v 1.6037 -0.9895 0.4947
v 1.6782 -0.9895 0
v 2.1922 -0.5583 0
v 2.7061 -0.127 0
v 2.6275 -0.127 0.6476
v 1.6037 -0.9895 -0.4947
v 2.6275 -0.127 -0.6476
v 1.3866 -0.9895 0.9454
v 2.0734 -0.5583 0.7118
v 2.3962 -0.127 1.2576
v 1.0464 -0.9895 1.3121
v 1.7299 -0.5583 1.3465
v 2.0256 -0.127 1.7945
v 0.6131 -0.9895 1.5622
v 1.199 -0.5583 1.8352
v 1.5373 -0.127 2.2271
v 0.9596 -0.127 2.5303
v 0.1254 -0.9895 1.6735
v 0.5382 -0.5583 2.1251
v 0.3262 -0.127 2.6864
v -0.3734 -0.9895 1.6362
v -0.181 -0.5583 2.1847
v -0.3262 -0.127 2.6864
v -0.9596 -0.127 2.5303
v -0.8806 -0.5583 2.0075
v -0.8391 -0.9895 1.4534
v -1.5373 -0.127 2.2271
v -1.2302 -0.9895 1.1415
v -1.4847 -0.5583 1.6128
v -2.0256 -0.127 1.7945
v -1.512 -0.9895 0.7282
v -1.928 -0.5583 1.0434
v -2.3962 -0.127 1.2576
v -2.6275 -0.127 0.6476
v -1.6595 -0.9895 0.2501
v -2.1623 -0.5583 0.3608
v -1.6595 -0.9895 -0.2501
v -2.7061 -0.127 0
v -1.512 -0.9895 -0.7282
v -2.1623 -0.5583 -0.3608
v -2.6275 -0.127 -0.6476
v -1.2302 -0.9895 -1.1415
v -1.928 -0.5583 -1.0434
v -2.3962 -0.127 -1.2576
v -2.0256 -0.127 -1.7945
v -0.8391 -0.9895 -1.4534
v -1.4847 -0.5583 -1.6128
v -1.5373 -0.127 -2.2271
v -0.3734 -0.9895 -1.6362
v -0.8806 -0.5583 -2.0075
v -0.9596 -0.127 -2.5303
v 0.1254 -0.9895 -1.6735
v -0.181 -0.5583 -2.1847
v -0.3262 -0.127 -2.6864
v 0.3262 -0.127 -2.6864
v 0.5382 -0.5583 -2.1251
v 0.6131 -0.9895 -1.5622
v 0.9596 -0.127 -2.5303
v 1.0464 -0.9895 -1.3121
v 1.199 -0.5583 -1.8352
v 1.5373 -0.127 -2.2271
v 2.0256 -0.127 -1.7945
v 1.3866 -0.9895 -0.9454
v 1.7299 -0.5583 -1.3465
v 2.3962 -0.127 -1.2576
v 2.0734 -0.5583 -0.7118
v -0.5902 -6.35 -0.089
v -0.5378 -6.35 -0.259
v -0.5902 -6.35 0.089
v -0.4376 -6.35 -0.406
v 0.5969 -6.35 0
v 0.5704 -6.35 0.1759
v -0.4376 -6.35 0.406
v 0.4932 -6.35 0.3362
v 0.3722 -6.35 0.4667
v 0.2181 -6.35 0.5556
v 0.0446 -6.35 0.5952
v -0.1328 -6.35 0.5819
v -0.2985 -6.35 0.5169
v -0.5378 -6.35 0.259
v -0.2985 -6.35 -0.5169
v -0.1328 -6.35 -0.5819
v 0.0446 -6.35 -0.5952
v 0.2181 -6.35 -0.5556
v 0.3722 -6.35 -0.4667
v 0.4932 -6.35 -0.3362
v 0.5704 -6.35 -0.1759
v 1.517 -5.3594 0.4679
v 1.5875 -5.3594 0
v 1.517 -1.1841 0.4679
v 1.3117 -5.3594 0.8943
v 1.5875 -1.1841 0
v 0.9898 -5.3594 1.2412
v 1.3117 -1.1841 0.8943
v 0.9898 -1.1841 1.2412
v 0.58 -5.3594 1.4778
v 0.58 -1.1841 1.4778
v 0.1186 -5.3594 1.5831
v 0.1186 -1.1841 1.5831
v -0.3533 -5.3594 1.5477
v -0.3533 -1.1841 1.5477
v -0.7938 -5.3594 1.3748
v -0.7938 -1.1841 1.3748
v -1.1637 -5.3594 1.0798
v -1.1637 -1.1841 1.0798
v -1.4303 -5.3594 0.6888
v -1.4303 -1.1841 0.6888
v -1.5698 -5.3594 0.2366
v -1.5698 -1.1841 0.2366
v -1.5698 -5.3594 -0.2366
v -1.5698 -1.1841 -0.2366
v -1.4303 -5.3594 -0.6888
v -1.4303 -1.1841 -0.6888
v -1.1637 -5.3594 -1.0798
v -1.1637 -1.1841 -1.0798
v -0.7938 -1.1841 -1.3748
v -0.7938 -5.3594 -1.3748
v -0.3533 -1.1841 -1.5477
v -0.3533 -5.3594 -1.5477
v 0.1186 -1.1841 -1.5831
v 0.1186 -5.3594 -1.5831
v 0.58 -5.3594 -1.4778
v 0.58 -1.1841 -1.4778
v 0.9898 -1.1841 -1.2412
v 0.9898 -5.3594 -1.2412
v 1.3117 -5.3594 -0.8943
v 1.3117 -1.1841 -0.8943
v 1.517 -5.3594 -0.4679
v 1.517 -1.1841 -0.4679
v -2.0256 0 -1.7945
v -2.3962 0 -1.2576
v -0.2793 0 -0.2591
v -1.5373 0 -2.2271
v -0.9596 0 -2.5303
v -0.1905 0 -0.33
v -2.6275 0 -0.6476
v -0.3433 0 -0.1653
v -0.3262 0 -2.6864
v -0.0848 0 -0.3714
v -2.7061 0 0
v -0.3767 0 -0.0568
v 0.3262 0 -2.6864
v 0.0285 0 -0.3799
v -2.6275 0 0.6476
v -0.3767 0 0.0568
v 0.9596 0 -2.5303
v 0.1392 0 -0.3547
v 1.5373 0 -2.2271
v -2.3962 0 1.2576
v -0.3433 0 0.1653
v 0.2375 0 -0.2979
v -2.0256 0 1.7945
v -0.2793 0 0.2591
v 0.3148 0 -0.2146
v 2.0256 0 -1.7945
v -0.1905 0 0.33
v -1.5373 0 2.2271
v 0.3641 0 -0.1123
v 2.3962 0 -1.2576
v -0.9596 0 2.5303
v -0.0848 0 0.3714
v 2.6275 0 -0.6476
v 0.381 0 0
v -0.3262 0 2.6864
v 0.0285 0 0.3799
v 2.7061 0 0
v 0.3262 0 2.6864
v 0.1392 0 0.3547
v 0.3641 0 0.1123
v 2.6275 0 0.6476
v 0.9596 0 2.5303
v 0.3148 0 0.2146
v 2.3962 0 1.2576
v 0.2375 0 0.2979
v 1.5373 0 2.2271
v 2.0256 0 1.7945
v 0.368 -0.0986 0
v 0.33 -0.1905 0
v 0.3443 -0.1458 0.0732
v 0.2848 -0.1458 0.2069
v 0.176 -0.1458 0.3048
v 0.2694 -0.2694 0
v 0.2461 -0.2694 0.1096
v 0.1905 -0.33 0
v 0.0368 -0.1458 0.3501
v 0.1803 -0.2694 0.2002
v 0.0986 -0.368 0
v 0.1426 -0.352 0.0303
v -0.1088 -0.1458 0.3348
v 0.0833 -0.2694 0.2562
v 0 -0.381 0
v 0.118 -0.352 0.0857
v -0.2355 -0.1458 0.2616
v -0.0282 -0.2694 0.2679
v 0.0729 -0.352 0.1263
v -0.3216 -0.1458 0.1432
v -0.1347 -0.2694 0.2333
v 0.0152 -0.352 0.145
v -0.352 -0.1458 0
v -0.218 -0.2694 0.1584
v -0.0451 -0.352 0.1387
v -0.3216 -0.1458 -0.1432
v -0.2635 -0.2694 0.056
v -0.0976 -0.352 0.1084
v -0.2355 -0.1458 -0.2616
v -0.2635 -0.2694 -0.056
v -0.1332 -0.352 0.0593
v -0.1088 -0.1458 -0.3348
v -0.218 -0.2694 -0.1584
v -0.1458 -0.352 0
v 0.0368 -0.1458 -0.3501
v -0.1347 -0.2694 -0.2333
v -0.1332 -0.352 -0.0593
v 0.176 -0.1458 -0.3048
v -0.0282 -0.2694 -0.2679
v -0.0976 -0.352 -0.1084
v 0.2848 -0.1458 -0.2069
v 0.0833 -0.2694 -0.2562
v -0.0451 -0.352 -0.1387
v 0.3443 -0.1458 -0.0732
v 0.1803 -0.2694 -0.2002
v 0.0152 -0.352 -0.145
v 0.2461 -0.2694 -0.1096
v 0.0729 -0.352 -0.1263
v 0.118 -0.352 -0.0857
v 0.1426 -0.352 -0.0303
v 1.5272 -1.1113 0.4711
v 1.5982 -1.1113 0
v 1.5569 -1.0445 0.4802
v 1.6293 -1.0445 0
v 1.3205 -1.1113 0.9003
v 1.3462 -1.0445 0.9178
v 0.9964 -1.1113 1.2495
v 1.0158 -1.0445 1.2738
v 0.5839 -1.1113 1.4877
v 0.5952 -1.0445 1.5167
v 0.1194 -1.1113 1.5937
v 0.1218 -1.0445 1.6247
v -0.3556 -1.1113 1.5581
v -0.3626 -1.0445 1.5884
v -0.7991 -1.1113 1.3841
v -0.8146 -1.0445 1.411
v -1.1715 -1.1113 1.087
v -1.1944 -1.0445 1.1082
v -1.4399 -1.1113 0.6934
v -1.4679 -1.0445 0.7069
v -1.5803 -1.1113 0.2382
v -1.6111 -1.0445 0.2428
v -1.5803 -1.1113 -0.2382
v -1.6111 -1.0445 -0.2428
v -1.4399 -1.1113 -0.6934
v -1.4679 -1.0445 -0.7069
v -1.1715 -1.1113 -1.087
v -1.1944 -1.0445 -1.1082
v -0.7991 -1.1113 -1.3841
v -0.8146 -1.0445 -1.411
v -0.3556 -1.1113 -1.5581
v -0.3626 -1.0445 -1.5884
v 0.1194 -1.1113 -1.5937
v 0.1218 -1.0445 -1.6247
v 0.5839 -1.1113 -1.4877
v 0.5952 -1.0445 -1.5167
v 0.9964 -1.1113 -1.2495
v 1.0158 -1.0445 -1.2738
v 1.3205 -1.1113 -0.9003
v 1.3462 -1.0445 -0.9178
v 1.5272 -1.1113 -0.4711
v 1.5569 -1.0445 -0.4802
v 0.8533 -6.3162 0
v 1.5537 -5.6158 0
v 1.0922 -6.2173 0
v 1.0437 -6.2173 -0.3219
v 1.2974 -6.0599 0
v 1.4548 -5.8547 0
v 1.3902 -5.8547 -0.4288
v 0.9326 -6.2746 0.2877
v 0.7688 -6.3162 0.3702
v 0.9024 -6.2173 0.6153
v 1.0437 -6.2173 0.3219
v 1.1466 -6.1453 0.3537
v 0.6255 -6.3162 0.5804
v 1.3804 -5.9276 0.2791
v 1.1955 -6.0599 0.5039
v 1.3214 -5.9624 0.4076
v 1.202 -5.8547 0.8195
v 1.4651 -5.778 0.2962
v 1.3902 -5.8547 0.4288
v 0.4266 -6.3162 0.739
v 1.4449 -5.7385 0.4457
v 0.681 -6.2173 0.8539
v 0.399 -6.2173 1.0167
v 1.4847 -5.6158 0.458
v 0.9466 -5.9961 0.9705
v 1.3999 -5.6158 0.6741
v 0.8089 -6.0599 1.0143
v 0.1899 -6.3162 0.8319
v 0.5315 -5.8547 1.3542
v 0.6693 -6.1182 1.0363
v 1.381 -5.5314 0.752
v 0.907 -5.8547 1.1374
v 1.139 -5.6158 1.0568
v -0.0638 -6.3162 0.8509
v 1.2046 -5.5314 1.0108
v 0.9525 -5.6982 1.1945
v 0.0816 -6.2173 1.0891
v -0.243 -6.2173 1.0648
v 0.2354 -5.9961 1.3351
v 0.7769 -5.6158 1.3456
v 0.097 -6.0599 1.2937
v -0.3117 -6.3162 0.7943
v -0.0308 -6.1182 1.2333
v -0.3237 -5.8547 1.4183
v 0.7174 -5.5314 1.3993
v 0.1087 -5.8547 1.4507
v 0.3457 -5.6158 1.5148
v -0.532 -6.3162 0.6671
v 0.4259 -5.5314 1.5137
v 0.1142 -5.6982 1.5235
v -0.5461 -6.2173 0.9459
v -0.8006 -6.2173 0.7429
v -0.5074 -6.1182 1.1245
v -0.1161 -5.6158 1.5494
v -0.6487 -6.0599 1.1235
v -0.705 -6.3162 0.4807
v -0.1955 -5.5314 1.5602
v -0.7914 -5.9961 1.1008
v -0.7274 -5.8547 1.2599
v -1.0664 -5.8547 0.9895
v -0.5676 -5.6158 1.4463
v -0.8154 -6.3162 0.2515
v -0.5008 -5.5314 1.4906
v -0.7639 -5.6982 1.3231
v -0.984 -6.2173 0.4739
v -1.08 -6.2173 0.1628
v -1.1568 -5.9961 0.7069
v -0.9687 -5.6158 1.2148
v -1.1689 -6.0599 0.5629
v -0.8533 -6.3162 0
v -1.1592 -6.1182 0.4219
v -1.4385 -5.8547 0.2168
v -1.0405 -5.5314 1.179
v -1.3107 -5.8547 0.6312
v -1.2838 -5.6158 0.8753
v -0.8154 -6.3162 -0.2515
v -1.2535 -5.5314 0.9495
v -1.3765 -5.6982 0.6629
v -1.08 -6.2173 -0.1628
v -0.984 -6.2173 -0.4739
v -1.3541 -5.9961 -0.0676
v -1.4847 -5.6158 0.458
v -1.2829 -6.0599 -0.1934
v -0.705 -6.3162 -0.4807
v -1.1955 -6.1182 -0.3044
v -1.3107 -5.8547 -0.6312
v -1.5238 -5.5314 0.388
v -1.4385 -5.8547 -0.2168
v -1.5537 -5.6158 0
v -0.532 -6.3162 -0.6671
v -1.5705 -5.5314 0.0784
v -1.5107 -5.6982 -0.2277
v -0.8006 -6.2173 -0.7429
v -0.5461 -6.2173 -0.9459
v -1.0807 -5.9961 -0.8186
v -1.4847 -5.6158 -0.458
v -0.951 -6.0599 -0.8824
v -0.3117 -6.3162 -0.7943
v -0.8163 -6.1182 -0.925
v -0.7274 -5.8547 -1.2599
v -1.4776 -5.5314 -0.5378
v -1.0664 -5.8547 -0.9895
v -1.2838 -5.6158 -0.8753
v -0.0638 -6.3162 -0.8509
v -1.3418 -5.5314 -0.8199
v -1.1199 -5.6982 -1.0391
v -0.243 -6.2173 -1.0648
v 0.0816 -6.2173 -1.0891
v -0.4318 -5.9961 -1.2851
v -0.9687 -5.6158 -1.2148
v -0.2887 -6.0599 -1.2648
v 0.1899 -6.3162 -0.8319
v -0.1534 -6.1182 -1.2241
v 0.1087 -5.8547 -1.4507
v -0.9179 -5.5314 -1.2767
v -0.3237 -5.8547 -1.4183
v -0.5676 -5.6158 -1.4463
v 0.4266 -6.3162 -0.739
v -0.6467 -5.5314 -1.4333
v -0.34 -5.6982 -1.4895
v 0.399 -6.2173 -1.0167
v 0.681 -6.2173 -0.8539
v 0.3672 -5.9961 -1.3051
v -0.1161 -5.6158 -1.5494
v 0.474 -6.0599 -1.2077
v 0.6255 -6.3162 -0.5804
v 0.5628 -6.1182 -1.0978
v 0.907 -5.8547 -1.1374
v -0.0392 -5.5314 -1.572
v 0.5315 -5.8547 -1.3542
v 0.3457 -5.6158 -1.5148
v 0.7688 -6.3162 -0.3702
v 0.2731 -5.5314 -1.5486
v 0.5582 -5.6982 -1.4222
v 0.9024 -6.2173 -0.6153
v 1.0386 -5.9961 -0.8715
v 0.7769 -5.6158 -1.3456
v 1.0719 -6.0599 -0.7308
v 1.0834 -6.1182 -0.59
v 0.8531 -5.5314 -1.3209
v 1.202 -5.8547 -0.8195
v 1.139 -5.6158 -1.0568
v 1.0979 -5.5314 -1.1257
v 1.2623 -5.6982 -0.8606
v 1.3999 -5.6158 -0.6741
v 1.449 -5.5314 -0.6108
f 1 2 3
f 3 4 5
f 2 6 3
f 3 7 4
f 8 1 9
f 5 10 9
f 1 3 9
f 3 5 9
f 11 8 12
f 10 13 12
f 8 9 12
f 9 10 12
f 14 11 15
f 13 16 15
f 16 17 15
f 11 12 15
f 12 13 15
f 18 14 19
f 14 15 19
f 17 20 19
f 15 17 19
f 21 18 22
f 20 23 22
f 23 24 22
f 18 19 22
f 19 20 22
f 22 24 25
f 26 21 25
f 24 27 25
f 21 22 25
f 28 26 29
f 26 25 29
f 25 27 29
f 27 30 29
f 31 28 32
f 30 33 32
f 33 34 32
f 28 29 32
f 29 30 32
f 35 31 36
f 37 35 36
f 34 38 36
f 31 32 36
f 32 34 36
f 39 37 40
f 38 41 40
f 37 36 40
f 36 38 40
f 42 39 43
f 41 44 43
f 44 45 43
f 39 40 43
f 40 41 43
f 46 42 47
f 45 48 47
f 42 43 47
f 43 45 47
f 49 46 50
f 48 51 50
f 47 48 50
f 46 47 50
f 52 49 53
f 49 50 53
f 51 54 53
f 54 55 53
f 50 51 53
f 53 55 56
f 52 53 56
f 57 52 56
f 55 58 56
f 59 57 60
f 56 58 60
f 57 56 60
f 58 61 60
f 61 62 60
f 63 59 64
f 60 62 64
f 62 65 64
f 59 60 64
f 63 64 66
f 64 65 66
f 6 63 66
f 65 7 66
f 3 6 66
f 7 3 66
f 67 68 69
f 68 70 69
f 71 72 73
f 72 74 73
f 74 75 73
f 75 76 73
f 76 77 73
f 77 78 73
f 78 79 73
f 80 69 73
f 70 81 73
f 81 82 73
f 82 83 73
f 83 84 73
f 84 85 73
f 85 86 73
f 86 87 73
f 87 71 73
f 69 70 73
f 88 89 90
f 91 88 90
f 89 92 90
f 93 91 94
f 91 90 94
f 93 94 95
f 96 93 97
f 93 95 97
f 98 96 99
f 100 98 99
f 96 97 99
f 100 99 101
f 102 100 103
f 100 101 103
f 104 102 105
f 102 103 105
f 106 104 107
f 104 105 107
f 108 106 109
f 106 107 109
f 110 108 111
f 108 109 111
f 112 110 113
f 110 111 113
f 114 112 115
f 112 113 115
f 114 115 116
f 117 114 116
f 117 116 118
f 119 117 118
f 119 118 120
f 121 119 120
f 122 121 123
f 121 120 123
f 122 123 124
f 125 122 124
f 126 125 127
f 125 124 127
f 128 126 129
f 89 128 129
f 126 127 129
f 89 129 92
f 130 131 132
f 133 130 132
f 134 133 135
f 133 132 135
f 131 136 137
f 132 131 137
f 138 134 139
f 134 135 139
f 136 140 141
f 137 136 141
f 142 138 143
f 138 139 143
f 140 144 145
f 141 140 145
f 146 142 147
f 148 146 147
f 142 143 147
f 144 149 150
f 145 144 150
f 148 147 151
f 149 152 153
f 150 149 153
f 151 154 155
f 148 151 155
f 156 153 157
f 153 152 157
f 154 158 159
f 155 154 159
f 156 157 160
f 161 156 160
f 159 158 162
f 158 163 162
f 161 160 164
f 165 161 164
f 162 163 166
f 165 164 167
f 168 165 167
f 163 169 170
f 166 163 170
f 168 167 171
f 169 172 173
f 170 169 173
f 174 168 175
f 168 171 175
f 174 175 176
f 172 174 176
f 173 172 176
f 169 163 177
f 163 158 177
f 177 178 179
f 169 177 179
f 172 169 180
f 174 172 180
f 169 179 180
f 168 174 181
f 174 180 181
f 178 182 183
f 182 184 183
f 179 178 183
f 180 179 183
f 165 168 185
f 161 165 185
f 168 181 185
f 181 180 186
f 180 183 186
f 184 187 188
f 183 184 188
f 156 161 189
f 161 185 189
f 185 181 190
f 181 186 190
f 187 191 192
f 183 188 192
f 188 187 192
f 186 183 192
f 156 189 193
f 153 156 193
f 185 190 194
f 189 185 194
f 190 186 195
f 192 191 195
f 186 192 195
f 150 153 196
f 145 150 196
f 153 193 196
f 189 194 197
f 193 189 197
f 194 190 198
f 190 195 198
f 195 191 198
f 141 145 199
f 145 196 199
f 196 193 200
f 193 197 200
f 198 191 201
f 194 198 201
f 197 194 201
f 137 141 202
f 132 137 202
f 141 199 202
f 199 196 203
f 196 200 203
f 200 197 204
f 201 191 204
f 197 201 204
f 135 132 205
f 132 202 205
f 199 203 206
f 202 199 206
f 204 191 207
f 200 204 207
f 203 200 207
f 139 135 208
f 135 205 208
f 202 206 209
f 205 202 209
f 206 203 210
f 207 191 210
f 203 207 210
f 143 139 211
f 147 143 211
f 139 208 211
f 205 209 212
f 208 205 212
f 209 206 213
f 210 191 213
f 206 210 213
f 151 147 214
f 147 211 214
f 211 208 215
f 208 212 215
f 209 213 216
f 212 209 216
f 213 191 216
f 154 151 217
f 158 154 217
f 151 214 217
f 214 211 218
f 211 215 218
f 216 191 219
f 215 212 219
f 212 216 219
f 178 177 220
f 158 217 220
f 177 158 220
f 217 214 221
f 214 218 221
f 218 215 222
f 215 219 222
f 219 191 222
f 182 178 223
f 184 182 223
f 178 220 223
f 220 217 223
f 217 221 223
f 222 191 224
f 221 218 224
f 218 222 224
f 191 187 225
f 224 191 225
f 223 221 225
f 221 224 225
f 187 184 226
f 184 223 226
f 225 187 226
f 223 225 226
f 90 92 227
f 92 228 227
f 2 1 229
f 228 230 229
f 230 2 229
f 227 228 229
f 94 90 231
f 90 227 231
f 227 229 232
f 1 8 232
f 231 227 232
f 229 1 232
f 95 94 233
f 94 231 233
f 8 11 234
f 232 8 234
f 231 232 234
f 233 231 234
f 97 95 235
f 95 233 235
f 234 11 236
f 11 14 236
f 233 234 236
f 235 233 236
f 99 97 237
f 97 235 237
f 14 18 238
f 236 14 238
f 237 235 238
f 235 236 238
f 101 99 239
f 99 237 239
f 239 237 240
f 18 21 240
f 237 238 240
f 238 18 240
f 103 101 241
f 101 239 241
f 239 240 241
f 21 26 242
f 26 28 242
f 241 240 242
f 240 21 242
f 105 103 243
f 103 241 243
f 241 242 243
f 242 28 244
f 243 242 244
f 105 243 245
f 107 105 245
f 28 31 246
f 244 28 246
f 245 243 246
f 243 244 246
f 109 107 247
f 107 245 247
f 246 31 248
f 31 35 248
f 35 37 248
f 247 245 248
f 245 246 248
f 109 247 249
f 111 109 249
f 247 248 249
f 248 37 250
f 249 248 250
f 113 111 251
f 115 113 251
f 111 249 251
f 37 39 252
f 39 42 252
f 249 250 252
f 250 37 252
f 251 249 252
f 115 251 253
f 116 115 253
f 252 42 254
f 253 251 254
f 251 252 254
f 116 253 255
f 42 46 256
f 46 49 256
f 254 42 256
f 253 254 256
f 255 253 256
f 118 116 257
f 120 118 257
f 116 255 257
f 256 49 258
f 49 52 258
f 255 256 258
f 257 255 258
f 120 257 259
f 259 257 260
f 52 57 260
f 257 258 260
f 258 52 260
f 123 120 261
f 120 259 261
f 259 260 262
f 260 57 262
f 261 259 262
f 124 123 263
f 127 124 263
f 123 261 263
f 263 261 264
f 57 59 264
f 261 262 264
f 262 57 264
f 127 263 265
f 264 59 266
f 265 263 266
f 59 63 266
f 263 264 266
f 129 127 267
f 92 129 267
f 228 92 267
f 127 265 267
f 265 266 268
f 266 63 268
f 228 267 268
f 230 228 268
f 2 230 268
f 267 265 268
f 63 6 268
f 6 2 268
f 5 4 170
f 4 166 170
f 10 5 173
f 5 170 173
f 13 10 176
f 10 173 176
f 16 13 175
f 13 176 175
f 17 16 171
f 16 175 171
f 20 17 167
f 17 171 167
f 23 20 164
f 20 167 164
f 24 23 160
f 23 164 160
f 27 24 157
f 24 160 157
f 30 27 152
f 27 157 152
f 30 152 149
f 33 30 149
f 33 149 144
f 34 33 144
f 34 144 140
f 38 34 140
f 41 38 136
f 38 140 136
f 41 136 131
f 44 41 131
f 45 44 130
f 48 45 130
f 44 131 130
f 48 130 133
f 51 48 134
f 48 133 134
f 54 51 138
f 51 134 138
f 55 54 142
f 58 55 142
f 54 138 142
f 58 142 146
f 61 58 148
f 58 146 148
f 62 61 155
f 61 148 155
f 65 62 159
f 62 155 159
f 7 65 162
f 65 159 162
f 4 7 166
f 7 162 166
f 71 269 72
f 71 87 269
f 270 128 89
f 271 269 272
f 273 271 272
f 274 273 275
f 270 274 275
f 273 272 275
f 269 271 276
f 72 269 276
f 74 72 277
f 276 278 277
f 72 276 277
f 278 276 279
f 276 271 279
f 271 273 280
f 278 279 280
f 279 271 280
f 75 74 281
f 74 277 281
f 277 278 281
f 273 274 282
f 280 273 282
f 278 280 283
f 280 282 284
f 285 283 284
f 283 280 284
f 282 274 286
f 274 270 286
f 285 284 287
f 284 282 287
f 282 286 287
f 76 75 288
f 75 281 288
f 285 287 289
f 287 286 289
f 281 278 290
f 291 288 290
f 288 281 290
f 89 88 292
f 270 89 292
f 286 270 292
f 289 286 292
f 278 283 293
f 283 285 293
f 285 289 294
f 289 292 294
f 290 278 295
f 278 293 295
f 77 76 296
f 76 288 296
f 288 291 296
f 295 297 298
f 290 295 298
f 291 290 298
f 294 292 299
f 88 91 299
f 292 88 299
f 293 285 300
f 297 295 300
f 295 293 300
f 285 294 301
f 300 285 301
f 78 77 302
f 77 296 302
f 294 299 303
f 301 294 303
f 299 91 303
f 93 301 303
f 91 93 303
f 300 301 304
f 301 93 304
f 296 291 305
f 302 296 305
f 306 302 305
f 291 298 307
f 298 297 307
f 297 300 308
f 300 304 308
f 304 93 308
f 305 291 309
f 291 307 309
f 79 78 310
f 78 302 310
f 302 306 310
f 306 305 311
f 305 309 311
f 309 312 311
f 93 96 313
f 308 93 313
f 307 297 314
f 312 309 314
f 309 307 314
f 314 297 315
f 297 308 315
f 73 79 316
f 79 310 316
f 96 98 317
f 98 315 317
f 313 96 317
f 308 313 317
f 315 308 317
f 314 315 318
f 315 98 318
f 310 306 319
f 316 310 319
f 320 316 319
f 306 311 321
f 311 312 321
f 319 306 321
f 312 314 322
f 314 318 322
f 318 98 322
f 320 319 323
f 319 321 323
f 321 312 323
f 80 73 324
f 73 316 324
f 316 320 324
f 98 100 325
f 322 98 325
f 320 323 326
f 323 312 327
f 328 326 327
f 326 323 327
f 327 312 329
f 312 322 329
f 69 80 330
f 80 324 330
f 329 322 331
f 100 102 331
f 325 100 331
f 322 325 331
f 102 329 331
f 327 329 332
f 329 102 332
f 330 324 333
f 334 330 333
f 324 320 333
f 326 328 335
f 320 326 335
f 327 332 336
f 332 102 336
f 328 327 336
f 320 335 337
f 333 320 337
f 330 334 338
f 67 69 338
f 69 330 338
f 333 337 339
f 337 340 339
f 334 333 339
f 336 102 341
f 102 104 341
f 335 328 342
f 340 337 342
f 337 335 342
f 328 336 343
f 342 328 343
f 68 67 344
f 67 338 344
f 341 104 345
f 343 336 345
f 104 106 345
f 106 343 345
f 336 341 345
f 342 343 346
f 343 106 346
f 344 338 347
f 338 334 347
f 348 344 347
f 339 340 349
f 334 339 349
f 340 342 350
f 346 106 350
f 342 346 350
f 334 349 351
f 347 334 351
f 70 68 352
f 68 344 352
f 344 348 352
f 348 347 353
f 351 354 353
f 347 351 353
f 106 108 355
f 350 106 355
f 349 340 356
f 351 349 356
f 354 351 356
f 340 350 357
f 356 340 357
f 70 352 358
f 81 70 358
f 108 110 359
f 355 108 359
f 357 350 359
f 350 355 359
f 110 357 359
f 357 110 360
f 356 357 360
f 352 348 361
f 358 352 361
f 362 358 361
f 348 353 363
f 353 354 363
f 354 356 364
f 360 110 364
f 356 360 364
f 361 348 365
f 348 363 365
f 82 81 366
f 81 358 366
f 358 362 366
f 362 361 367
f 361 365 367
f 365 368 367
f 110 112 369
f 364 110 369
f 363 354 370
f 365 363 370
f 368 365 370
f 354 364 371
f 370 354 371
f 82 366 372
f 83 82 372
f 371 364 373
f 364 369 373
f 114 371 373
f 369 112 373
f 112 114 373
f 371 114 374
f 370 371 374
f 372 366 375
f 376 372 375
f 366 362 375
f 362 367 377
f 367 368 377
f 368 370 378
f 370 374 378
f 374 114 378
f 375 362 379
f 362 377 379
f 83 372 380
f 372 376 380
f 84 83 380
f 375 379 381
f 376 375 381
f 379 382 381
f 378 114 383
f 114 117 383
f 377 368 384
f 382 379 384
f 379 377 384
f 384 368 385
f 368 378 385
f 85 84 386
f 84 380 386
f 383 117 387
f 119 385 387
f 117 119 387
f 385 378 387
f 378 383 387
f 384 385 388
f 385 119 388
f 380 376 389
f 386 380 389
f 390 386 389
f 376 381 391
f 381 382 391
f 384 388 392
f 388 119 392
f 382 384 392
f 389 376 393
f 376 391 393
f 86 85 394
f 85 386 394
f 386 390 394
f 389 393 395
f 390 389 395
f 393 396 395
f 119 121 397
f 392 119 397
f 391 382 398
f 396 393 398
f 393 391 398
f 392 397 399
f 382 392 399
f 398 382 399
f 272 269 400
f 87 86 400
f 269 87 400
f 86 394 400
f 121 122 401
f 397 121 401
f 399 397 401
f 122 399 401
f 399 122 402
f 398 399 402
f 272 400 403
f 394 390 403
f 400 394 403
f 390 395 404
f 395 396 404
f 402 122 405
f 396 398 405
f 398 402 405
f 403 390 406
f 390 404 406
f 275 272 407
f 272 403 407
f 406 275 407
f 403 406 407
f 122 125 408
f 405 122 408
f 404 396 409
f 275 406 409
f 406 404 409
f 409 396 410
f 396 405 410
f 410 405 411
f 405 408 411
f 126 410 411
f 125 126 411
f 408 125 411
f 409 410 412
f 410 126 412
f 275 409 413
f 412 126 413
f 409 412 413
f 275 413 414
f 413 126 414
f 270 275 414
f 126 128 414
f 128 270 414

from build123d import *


with BuildPart() as part:
    # Sketch1 → Revolve1 (revolve)
    with BuildSketch(Plane.XY):
        with BuildLine():
            Line((0, -0.381), (0, -6.35))
            Line((0, -6.35), (0.5969, -6.35))
            ThreePointArc((0.5969, -6.35), (1.297359977, -6.059859977), (1.5875, -5.3594))
            Line((1.5875, -5.3594), (1.5875, -1.184098677))
            ThreePointArc((1.5875, -1.184098677), (1.611297822, -1.076753638), (1.678231947, -0.989523388))
            Line((1.678231947, -0.989523388), (2.706147294, -0.127))
            Line((2.706147294, -0.127), (2.706147294, 0))
            Line((2.706147294, 0), (0.381, 0))
            ThreePointArc((0.381, 0), (0.269407684, -0.269407684), (0, -0.381))
        make_face()
    revolve(axis=Axis((0, 28.449499207, 0), (0, -1, 0)))


solid = part.part
